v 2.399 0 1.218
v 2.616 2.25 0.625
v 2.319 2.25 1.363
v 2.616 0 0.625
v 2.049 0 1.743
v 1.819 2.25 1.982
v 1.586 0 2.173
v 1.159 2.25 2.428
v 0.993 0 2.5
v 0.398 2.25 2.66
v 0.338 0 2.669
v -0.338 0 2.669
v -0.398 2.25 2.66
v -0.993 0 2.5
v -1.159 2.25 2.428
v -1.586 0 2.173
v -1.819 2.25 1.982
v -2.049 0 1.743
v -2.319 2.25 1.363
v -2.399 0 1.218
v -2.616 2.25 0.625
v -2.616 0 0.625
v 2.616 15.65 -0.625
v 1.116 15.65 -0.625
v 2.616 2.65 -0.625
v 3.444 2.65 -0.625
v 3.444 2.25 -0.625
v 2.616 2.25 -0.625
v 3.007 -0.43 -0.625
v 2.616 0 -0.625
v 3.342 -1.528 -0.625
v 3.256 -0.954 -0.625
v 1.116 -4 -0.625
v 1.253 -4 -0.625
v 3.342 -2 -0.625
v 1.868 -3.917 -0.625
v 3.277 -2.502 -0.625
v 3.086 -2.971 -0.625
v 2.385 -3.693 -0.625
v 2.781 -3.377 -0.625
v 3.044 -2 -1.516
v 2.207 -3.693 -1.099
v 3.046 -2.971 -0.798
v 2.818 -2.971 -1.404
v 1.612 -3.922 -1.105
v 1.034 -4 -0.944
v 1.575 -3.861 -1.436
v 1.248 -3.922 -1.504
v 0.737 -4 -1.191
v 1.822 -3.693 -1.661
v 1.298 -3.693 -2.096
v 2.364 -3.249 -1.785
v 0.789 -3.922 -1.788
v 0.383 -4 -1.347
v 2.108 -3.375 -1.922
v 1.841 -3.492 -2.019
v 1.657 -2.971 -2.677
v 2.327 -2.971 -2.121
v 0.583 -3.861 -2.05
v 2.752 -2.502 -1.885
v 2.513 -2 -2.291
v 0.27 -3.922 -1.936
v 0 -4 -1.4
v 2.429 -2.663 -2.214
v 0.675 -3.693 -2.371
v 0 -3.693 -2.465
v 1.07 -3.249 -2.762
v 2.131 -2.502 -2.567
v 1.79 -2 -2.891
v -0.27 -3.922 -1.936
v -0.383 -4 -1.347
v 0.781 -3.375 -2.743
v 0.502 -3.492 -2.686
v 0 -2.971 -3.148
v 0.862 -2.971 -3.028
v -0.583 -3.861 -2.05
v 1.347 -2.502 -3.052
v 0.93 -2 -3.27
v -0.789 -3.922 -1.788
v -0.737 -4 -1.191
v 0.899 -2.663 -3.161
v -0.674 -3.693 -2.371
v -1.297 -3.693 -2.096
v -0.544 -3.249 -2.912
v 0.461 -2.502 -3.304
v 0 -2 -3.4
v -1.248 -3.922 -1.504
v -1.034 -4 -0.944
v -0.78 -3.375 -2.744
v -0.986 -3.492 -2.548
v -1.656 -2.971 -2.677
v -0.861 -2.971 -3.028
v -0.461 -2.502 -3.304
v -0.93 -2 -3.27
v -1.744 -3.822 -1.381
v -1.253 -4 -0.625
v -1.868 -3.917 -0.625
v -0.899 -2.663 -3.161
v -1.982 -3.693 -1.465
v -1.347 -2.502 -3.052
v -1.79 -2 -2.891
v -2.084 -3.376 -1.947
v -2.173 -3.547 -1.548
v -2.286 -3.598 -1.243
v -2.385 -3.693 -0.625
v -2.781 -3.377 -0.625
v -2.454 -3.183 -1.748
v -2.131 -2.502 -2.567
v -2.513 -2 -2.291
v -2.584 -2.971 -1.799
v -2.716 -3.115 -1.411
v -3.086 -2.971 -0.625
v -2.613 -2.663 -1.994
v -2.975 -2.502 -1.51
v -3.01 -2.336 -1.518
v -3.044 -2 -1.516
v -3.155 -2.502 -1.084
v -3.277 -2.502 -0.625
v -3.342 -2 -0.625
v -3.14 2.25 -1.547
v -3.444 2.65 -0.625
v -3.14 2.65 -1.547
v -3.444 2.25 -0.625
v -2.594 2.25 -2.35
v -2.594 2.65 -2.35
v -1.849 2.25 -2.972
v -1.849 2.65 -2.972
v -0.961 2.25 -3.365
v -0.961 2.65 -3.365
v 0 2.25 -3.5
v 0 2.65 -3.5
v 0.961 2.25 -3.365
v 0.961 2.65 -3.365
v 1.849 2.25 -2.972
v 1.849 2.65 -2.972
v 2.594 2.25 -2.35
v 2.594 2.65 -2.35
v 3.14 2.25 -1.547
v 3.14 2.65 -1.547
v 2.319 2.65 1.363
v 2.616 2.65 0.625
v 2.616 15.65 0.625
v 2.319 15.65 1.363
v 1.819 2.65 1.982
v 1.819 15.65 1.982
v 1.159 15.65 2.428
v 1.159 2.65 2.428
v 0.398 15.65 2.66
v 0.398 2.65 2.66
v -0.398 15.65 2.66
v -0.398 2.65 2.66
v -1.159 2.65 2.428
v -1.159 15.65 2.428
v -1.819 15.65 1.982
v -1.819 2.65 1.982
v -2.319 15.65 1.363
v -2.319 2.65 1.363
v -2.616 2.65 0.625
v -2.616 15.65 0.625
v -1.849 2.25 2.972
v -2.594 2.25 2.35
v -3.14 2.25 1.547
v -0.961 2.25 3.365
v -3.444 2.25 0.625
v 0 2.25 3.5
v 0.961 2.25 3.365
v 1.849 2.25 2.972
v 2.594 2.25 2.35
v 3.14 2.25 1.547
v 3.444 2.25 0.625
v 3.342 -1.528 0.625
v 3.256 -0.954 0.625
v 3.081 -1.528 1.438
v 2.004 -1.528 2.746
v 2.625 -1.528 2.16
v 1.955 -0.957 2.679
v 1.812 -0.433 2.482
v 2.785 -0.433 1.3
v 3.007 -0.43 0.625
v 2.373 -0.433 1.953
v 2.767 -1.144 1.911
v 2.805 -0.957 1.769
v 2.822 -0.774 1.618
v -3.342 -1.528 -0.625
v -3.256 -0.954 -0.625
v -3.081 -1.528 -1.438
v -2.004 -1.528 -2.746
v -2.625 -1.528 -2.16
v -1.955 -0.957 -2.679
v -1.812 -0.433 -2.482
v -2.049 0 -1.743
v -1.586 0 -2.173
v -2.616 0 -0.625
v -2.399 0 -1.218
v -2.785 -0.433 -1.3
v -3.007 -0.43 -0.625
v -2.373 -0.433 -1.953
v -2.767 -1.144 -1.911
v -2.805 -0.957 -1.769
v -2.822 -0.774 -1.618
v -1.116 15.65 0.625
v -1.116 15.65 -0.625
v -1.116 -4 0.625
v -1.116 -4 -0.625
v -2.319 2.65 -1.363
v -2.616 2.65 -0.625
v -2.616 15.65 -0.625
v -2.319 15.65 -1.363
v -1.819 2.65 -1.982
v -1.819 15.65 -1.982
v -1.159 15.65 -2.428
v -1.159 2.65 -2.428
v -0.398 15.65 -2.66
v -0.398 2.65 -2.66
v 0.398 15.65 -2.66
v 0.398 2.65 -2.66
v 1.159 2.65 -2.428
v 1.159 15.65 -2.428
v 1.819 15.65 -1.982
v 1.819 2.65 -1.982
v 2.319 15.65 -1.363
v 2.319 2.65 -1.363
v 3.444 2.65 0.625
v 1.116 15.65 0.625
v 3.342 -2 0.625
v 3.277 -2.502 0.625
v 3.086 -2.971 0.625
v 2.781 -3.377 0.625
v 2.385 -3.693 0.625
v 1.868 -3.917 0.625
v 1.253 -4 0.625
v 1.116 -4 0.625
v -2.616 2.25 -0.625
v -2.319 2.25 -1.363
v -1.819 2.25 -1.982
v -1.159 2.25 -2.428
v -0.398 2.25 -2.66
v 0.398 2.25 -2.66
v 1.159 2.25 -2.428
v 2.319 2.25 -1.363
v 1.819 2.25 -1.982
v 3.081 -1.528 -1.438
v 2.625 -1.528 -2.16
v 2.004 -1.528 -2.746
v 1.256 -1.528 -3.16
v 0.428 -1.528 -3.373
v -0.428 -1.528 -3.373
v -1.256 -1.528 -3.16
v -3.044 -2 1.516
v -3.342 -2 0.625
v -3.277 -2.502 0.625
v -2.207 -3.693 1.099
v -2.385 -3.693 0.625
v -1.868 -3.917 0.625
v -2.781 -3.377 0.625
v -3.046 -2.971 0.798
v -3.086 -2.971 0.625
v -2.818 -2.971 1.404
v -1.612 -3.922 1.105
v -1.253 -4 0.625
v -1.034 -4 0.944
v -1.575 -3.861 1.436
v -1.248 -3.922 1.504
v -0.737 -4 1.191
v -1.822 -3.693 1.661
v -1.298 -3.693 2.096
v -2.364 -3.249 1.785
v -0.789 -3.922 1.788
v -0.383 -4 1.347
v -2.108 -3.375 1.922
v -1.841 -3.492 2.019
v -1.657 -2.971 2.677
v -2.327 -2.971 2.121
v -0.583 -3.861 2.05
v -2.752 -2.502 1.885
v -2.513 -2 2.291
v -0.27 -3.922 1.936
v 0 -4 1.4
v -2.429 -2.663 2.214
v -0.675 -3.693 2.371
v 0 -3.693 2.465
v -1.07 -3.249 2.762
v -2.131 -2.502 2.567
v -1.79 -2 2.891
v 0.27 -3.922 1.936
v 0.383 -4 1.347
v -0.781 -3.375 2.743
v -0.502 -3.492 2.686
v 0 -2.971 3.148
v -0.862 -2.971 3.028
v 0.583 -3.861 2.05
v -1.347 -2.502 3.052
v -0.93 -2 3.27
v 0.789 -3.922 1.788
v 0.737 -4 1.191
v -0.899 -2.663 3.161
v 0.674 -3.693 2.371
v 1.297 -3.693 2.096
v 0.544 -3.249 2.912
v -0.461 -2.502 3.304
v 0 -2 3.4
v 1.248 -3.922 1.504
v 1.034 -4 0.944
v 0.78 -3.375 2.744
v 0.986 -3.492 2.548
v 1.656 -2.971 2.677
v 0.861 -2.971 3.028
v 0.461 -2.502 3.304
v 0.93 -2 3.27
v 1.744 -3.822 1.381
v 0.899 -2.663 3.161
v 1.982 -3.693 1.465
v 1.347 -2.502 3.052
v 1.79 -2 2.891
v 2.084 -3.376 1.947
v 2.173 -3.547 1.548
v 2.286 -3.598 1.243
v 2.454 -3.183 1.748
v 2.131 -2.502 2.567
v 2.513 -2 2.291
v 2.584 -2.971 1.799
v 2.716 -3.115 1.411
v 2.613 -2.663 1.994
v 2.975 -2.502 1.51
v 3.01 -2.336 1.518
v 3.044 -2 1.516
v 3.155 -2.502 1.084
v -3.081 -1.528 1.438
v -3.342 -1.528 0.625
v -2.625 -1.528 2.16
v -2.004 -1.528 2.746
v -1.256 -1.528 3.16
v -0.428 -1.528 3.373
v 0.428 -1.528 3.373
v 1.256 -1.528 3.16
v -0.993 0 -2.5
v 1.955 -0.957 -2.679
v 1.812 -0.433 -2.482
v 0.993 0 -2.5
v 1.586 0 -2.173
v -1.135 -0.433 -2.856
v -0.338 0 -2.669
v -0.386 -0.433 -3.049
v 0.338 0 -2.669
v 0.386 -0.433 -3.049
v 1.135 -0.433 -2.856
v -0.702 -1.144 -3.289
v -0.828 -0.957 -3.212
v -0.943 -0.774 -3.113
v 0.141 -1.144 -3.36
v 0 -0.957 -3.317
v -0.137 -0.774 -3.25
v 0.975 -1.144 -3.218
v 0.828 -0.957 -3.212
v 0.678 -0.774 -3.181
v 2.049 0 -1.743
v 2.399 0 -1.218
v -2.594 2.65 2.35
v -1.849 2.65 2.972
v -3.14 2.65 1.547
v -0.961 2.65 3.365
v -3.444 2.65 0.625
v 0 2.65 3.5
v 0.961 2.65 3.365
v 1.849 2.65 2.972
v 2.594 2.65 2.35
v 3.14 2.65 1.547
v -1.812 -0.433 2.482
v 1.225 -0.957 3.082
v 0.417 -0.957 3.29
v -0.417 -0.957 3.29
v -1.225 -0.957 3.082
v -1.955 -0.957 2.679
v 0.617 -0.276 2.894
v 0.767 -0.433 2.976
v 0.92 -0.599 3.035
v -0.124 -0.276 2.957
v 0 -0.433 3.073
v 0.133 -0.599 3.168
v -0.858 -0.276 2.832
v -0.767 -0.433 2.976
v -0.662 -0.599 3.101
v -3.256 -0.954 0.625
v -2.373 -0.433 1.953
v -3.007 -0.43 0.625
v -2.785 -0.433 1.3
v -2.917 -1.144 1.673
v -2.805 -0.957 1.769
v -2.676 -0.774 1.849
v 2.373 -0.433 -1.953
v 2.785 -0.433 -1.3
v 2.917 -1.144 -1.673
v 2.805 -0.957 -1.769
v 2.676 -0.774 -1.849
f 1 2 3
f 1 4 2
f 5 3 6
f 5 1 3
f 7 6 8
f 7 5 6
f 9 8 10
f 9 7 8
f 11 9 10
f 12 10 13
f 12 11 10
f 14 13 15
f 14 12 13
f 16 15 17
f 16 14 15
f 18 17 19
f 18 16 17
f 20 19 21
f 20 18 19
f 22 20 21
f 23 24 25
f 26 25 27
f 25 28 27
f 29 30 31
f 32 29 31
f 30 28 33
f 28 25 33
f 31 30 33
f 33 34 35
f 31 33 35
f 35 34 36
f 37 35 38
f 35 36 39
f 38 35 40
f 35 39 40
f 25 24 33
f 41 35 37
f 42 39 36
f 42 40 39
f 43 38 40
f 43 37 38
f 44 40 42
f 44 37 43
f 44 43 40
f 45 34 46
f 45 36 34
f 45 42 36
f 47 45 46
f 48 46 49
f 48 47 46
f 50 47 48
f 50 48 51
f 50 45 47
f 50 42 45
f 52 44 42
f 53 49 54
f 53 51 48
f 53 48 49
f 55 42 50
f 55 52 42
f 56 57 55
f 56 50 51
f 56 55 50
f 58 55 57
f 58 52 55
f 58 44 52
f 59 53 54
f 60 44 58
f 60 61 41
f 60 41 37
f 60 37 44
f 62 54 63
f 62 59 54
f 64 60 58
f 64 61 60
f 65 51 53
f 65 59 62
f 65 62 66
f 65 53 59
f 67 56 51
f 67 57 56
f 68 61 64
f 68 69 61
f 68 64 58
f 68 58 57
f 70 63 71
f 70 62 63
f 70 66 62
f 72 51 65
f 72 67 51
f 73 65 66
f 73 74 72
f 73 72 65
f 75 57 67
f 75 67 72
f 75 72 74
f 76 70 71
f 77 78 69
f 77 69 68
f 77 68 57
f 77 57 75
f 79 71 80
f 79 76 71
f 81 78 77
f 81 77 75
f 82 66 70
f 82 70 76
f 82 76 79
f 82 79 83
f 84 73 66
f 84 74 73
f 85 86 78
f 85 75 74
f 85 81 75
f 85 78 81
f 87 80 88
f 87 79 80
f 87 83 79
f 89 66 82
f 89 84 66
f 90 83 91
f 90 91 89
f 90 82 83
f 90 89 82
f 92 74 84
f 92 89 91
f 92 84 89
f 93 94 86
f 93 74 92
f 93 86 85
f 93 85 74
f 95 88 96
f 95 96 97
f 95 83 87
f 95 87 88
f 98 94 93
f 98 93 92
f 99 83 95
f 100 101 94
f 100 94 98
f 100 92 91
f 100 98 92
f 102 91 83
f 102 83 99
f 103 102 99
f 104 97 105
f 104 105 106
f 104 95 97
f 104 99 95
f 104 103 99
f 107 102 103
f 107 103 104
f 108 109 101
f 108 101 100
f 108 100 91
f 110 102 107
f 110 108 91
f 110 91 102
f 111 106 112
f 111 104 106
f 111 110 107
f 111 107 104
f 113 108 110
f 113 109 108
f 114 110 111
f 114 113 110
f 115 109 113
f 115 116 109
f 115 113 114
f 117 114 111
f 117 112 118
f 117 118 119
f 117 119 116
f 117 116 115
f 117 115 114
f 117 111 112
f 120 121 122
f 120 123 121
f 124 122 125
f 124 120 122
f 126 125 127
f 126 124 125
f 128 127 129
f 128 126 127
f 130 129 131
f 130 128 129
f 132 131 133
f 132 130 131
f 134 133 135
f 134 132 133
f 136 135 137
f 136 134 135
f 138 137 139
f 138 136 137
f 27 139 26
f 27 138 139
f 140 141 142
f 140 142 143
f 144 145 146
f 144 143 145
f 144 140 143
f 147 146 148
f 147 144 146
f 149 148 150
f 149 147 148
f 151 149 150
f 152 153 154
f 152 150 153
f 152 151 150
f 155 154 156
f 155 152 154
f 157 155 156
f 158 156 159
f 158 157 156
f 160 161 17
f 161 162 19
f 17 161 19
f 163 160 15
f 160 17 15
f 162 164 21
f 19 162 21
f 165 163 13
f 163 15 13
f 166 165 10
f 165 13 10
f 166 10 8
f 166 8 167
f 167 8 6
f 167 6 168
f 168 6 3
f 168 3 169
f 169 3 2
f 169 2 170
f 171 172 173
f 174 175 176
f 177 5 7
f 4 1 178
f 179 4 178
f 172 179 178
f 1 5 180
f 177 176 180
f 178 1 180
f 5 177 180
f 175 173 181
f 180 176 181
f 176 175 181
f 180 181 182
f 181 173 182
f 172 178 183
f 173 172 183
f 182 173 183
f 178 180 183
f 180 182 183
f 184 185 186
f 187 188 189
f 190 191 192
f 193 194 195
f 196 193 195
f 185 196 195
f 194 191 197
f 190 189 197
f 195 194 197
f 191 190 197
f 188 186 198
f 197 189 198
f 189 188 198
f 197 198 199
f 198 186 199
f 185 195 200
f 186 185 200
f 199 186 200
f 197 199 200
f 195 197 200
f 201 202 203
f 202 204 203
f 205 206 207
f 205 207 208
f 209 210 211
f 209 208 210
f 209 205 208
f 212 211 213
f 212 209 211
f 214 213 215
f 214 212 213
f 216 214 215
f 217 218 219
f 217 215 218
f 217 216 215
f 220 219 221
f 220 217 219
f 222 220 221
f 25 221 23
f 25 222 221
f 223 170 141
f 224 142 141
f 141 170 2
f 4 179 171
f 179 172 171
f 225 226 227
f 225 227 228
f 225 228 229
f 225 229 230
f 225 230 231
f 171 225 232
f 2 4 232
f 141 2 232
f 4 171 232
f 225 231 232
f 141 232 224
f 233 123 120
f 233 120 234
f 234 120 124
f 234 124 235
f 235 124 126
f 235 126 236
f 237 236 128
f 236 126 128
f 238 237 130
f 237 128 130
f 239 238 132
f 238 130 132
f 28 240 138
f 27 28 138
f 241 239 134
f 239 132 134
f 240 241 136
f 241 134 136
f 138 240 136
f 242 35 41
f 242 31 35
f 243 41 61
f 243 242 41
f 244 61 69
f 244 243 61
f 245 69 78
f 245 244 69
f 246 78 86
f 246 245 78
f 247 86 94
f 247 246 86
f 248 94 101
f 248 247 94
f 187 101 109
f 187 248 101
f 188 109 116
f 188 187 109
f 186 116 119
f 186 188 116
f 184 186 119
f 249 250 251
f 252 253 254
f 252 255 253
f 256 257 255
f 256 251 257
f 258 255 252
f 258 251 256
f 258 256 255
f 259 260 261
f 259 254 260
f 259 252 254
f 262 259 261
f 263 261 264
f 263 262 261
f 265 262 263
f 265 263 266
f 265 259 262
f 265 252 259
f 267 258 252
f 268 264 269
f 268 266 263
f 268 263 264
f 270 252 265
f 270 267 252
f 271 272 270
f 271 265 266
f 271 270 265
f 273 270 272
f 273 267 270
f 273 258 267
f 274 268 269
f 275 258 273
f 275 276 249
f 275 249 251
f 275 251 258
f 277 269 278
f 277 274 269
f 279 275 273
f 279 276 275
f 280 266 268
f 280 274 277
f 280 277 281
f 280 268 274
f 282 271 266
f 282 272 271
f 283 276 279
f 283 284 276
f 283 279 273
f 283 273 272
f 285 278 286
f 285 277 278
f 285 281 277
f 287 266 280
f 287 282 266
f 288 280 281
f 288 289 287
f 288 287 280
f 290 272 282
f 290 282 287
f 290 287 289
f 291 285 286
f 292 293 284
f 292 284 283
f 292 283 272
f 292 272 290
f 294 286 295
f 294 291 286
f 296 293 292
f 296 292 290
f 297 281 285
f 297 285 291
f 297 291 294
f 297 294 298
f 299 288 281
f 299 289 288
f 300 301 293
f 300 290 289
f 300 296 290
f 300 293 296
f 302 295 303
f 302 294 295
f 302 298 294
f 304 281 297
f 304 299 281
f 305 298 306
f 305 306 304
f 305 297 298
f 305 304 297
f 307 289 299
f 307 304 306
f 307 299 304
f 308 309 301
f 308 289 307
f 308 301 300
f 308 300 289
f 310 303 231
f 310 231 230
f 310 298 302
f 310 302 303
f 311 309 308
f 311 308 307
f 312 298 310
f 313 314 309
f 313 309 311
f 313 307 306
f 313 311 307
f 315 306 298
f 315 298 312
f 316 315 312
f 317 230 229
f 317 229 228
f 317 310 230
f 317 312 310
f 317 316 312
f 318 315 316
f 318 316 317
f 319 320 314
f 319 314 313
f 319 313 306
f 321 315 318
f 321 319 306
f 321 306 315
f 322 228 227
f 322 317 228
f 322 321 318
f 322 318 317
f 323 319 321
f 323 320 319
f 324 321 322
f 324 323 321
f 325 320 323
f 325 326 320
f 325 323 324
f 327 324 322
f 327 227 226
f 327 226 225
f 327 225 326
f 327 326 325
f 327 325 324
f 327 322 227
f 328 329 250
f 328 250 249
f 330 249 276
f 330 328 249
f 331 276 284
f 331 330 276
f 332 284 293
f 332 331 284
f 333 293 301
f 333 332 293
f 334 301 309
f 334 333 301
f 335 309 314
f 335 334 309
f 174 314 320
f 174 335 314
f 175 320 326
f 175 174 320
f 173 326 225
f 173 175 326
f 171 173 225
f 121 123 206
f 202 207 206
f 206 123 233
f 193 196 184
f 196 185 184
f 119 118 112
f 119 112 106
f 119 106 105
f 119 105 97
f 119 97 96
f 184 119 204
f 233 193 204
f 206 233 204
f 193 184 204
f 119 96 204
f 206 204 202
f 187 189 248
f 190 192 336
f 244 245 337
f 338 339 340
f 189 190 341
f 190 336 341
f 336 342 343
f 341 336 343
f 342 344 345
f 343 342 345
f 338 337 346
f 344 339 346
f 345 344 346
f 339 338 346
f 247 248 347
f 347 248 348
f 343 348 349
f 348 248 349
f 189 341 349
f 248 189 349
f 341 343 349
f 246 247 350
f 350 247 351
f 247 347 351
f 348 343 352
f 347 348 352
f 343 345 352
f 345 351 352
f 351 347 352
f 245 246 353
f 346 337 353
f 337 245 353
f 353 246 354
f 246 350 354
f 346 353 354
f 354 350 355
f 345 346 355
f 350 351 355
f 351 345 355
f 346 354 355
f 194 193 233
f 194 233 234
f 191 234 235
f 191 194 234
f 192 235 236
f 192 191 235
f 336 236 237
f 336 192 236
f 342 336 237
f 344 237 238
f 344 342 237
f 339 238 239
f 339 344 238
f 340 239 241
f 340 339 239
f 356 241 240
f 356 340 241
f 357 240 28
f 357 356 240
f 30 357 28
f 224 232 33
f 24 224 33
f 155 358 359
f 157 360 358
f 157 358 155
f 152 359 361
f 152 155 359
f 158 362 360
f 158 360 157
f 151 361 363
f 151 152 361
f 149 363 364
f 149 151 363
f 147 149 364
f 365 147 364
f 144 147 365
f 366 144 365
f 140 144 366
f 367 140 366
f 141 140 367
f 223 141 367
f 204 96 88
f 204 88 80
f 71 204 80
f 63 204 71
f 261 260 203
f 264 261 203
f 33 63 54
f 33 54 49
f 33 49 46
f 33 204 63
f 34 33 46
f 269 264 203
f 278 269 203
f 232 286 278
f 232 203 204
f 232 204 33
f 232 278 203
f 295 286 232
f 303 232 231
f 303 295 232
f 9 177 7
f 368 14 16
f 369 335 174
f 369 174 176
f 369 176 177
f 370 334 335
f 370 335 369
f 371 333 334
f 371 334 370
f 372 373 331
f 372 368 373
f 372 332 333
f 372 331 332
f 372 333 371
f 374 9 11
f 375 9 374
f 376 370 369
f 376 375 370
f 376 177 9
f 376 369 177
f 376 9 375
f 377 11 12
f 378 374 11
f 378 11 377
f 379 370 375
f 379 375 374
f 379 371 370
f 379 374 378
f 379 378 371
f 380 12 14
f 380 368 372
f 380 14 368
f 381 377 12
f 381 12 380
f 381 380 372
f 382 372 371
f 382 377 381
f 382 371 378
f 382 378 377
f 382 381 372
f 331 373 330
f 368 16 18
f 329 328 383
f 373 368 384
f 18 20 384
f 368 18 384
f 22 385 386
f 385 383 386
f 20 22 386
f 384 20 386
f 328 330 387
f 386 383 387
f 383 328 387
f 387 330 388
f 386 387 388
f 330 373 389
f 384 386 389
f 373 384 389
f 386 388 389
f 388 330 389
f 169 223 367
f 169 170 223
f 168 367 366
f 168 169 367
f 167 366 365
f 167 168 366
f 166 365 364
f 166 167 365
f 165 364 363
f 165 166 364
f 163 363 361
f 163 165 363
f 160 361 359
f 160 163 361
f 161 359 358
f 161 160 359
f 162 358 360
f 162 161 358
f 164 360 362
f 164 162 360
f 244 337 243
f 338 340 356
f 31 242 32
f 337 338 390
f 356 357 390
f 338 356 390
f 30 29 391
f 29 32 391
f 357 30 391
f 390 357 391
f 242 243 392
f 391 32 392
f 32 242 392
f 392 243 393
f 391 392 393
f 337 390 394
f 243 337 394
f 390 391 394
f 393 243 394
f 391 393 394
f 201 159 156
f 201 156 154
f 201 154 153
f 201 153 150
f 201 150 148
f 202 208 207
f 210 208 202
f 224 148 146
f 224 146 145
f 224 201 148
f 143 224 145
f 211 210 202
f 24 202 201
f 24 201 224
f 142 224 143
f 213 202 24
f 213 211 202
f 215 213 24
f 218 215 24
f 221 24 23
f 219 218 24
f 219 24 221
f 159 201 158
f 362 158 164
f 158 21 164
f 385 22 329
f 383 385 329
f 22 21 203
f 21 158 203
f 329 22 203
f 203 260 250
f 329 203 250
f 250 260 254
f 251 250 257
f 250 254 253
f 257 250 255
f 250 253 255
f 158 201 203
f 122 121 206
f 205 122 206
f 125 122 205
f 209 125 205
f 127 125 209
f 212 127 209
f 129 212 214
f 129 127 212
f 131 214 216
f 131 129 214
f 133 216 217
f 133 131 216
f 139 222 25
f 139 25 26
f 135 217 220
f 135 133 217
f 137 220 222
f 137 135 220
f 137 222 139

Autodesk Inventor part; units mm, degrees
ref_plane "YZ Plane" through (0, 0, 0) normal (1, 0, 0) x (0, 1, 0)
ref_plane "XZ Plane" through (0, 0, 0) normal (0, 1, 0) x (-1, 0, 0)
ref_plane "XY Plane" through (0, 0, 0) normal (0, 0, 1) x (1, 0, 0)
sketch "Sketch1" plane through (0, 0, 0) normal (0, 1, 0) x (-1, 0, 0)
  line L0 (2.6164, 0.625) -> (1.1164, 0.625)
  line L1 (1.1164, 0.625) -> (1.1164, -0.625)
  line L2 (1.1164, -0.625) -> (2.6164, -0.625)
  line L3 (-2.6164, 0.625) -> (-1.1164, 0.625)
  line L4 (-1.1164, 0.625) -> (-1.1164, -0.625)
  line L5 (-1.1164, -0.625) -> (-2.6164, -0.625)
  line L6 (1.1164, 0) -> (-1.1164, 0) construction
  arc A0 (2.6164, 0.625) -> (-2.6164, 0.625) centre (0, 0) ccw
  arc A1 (-2.6164, -0.625) -> (2.6164, -0.625) centre (0, 0) ccw
  dimension "d1" = 2.69
  dimension "d2" = 2.69
  dimension "d3" = 1.5
  dimension "d4" = 1.25
extrude "Extrusion1" add sketch "Sketch1" along normal blind 2.25
sketch "Sketch2" plane through (0, 2.25, 0) normal (0, 1, 0) x (1, 0, 0)
  line L0 (-1.1164, 0.625) -> (-1.1164, -0.625) projected
  line L1 (-1.1164, -0.625) -> (-2.6164, -0.625) projected
  arc A0 (-2.6164, -0.625) -> (2.6164, -0.625) centre (0, 0) ccw construction
  line L2 (2.6164, -0.625) -> (1.1164, -0.625) projected
  line L3 (1.1164, -0.625) -> (1.1164, 0.625) projected
  line L4 (1.1164, 0.625) -> (2.6164, 0.625) projected
  arc A1 (2.6164, 0.625) -> (-2.6164, 0.625) centre (0, 0) ccw construction
  line L5 (-2.6164, 0.625) -> (-1.1164, 0.625) projected
  arc A2 (-3.4437, -0.625) -> (3.4437, -0.625) centre (0, 0) ccw
  arc A3 (3.4437, 0.625) -> (-3.4437, 0.625) centre (0, 0) ccw
  line L6 (-2.6164, -0.625) -> (-3.4437, -0.625)
  arc A4 (2.6164, 0.625) -> (-2.6164, 0.625) centre (0, 0) ccw construction
  line L7 (-2.6164, 0.625) -> (-3.4437, 0.625)
  line L8 (2.6164, 0.625) -> (3.4437, 0.625)
  line L9 (2.6164, -0.625) -> (3.4437, -0.625)
  dimension "d7" = 3.5
  dimension "d8" = 3.5
extrude "Extrusion2" add sketch "Sketch2" along normal blind 0.4
sketch "Sketch3" plane through (0, 2.65, 0) normal (0, 1, 0) x (1, 0, 0)
  arc A0 (-2.6164, -0.625) -> (2.6164, -0.625) centre (0, 0) ccw projected
  arc A1 (2.6164, 0.625) -> (-2.6164, 0.625) centre (0, 0) ccw projected
  line L0 (-3.4437, 0.625) -> (-1.1164, 0.625) projected
  line L1 (-1.1164, 0.625) -> (-1.1164, -0.625) projected
  line L2 (-1.1164, -0.625) -> (-3.4437, -0.625) projected
  line L3 (3.4437, -0.625) -> (1.1164, -0.625) projected
  line L4 (1.1164, -0.625) -> (1.1164, 0.625) projected
  line L5 (1.1164, 0.625) -> (3.4437, 0.625) projected
extrude "Extrusion3" add sketch "Sketch3" along normal blind 13
sketch "Sketch4" plane through (0, 0, 0) normal (0, -1, 0) x (1, 0, 0)
  line L0 (-1.1164, -0.625) -> (-1.1164, 0.625) projected
  line L1 (-2.6164, -0.625) -> (-1.1164, -0.625) projected
  arc A0 (-2.6164, -0.625) -> (2.6164, -0.625) centre (0, 0) ccw construction
  line L2 (1.1164, -0.625) -> (2.6164, -0.625) projected
  line L3 (1.1164, 0.625) -> (1.1164, -0.625) projected
  line L4 (2.6164, 0.625) -> (1.1164, 0.625) projected
  arc A1 (2.6164, 0.625) -> (-2.6164, 0.625) centre (0, 0) ccw construction
  line L5 (-1.1164, 0.625) -> (-2.6164, 0.625) projected
  arc A2 (3.3421, 0.625) -> (-3.3421, 0.625) centre (0, 0) ccw
  arc A3 (-3.3421, -0.625) -> (3.3421, -0.625) centre (0, 0) ccw
  line L6 (2.6164, 0.625) -> (3.3421, 0.625)
  line L7 (3.4437, 0.625) -> (2.6164, 0.625) projected
  arc A4 (-2.6164, -0.625) -> (2.6164, -0.625) centre (0, 0) ccw projected
  line L8 (2.6164, -0.625) -> (3.4437, -0.625) projected
  line L9 (-2.6164, -0.625) -> (-3.3421, -0.625)
  line L10 (-3.4437, -0.625) -> (-2.6164, -0.625) projected
  line L11 (-2.6164, 0.625) -> (-3.3421, 0.625)
  line L12 (-2.6164, 0.625) -> (-3.4437, 0.625) projected
  dimension "d13" = 3.4
  dimension "d14" = 3.4
extrude "Extrusion4" add sketch "Sketch4" along normal blind 4
fillet "Fillet1" radius 2 2 edges at (0, 0, -3.4) (0, 0, 3.4)
fillet "Fillet2" radius 2 2 edges at (0, -4, -3.4) (0, -4, 3.4)
equation "\"d2\" = d1"
equation "\"d8\" = d7"
equation "\"d14\" = d13"
properties part number "Toggle_Level" material "PC/ABS Plastic"
